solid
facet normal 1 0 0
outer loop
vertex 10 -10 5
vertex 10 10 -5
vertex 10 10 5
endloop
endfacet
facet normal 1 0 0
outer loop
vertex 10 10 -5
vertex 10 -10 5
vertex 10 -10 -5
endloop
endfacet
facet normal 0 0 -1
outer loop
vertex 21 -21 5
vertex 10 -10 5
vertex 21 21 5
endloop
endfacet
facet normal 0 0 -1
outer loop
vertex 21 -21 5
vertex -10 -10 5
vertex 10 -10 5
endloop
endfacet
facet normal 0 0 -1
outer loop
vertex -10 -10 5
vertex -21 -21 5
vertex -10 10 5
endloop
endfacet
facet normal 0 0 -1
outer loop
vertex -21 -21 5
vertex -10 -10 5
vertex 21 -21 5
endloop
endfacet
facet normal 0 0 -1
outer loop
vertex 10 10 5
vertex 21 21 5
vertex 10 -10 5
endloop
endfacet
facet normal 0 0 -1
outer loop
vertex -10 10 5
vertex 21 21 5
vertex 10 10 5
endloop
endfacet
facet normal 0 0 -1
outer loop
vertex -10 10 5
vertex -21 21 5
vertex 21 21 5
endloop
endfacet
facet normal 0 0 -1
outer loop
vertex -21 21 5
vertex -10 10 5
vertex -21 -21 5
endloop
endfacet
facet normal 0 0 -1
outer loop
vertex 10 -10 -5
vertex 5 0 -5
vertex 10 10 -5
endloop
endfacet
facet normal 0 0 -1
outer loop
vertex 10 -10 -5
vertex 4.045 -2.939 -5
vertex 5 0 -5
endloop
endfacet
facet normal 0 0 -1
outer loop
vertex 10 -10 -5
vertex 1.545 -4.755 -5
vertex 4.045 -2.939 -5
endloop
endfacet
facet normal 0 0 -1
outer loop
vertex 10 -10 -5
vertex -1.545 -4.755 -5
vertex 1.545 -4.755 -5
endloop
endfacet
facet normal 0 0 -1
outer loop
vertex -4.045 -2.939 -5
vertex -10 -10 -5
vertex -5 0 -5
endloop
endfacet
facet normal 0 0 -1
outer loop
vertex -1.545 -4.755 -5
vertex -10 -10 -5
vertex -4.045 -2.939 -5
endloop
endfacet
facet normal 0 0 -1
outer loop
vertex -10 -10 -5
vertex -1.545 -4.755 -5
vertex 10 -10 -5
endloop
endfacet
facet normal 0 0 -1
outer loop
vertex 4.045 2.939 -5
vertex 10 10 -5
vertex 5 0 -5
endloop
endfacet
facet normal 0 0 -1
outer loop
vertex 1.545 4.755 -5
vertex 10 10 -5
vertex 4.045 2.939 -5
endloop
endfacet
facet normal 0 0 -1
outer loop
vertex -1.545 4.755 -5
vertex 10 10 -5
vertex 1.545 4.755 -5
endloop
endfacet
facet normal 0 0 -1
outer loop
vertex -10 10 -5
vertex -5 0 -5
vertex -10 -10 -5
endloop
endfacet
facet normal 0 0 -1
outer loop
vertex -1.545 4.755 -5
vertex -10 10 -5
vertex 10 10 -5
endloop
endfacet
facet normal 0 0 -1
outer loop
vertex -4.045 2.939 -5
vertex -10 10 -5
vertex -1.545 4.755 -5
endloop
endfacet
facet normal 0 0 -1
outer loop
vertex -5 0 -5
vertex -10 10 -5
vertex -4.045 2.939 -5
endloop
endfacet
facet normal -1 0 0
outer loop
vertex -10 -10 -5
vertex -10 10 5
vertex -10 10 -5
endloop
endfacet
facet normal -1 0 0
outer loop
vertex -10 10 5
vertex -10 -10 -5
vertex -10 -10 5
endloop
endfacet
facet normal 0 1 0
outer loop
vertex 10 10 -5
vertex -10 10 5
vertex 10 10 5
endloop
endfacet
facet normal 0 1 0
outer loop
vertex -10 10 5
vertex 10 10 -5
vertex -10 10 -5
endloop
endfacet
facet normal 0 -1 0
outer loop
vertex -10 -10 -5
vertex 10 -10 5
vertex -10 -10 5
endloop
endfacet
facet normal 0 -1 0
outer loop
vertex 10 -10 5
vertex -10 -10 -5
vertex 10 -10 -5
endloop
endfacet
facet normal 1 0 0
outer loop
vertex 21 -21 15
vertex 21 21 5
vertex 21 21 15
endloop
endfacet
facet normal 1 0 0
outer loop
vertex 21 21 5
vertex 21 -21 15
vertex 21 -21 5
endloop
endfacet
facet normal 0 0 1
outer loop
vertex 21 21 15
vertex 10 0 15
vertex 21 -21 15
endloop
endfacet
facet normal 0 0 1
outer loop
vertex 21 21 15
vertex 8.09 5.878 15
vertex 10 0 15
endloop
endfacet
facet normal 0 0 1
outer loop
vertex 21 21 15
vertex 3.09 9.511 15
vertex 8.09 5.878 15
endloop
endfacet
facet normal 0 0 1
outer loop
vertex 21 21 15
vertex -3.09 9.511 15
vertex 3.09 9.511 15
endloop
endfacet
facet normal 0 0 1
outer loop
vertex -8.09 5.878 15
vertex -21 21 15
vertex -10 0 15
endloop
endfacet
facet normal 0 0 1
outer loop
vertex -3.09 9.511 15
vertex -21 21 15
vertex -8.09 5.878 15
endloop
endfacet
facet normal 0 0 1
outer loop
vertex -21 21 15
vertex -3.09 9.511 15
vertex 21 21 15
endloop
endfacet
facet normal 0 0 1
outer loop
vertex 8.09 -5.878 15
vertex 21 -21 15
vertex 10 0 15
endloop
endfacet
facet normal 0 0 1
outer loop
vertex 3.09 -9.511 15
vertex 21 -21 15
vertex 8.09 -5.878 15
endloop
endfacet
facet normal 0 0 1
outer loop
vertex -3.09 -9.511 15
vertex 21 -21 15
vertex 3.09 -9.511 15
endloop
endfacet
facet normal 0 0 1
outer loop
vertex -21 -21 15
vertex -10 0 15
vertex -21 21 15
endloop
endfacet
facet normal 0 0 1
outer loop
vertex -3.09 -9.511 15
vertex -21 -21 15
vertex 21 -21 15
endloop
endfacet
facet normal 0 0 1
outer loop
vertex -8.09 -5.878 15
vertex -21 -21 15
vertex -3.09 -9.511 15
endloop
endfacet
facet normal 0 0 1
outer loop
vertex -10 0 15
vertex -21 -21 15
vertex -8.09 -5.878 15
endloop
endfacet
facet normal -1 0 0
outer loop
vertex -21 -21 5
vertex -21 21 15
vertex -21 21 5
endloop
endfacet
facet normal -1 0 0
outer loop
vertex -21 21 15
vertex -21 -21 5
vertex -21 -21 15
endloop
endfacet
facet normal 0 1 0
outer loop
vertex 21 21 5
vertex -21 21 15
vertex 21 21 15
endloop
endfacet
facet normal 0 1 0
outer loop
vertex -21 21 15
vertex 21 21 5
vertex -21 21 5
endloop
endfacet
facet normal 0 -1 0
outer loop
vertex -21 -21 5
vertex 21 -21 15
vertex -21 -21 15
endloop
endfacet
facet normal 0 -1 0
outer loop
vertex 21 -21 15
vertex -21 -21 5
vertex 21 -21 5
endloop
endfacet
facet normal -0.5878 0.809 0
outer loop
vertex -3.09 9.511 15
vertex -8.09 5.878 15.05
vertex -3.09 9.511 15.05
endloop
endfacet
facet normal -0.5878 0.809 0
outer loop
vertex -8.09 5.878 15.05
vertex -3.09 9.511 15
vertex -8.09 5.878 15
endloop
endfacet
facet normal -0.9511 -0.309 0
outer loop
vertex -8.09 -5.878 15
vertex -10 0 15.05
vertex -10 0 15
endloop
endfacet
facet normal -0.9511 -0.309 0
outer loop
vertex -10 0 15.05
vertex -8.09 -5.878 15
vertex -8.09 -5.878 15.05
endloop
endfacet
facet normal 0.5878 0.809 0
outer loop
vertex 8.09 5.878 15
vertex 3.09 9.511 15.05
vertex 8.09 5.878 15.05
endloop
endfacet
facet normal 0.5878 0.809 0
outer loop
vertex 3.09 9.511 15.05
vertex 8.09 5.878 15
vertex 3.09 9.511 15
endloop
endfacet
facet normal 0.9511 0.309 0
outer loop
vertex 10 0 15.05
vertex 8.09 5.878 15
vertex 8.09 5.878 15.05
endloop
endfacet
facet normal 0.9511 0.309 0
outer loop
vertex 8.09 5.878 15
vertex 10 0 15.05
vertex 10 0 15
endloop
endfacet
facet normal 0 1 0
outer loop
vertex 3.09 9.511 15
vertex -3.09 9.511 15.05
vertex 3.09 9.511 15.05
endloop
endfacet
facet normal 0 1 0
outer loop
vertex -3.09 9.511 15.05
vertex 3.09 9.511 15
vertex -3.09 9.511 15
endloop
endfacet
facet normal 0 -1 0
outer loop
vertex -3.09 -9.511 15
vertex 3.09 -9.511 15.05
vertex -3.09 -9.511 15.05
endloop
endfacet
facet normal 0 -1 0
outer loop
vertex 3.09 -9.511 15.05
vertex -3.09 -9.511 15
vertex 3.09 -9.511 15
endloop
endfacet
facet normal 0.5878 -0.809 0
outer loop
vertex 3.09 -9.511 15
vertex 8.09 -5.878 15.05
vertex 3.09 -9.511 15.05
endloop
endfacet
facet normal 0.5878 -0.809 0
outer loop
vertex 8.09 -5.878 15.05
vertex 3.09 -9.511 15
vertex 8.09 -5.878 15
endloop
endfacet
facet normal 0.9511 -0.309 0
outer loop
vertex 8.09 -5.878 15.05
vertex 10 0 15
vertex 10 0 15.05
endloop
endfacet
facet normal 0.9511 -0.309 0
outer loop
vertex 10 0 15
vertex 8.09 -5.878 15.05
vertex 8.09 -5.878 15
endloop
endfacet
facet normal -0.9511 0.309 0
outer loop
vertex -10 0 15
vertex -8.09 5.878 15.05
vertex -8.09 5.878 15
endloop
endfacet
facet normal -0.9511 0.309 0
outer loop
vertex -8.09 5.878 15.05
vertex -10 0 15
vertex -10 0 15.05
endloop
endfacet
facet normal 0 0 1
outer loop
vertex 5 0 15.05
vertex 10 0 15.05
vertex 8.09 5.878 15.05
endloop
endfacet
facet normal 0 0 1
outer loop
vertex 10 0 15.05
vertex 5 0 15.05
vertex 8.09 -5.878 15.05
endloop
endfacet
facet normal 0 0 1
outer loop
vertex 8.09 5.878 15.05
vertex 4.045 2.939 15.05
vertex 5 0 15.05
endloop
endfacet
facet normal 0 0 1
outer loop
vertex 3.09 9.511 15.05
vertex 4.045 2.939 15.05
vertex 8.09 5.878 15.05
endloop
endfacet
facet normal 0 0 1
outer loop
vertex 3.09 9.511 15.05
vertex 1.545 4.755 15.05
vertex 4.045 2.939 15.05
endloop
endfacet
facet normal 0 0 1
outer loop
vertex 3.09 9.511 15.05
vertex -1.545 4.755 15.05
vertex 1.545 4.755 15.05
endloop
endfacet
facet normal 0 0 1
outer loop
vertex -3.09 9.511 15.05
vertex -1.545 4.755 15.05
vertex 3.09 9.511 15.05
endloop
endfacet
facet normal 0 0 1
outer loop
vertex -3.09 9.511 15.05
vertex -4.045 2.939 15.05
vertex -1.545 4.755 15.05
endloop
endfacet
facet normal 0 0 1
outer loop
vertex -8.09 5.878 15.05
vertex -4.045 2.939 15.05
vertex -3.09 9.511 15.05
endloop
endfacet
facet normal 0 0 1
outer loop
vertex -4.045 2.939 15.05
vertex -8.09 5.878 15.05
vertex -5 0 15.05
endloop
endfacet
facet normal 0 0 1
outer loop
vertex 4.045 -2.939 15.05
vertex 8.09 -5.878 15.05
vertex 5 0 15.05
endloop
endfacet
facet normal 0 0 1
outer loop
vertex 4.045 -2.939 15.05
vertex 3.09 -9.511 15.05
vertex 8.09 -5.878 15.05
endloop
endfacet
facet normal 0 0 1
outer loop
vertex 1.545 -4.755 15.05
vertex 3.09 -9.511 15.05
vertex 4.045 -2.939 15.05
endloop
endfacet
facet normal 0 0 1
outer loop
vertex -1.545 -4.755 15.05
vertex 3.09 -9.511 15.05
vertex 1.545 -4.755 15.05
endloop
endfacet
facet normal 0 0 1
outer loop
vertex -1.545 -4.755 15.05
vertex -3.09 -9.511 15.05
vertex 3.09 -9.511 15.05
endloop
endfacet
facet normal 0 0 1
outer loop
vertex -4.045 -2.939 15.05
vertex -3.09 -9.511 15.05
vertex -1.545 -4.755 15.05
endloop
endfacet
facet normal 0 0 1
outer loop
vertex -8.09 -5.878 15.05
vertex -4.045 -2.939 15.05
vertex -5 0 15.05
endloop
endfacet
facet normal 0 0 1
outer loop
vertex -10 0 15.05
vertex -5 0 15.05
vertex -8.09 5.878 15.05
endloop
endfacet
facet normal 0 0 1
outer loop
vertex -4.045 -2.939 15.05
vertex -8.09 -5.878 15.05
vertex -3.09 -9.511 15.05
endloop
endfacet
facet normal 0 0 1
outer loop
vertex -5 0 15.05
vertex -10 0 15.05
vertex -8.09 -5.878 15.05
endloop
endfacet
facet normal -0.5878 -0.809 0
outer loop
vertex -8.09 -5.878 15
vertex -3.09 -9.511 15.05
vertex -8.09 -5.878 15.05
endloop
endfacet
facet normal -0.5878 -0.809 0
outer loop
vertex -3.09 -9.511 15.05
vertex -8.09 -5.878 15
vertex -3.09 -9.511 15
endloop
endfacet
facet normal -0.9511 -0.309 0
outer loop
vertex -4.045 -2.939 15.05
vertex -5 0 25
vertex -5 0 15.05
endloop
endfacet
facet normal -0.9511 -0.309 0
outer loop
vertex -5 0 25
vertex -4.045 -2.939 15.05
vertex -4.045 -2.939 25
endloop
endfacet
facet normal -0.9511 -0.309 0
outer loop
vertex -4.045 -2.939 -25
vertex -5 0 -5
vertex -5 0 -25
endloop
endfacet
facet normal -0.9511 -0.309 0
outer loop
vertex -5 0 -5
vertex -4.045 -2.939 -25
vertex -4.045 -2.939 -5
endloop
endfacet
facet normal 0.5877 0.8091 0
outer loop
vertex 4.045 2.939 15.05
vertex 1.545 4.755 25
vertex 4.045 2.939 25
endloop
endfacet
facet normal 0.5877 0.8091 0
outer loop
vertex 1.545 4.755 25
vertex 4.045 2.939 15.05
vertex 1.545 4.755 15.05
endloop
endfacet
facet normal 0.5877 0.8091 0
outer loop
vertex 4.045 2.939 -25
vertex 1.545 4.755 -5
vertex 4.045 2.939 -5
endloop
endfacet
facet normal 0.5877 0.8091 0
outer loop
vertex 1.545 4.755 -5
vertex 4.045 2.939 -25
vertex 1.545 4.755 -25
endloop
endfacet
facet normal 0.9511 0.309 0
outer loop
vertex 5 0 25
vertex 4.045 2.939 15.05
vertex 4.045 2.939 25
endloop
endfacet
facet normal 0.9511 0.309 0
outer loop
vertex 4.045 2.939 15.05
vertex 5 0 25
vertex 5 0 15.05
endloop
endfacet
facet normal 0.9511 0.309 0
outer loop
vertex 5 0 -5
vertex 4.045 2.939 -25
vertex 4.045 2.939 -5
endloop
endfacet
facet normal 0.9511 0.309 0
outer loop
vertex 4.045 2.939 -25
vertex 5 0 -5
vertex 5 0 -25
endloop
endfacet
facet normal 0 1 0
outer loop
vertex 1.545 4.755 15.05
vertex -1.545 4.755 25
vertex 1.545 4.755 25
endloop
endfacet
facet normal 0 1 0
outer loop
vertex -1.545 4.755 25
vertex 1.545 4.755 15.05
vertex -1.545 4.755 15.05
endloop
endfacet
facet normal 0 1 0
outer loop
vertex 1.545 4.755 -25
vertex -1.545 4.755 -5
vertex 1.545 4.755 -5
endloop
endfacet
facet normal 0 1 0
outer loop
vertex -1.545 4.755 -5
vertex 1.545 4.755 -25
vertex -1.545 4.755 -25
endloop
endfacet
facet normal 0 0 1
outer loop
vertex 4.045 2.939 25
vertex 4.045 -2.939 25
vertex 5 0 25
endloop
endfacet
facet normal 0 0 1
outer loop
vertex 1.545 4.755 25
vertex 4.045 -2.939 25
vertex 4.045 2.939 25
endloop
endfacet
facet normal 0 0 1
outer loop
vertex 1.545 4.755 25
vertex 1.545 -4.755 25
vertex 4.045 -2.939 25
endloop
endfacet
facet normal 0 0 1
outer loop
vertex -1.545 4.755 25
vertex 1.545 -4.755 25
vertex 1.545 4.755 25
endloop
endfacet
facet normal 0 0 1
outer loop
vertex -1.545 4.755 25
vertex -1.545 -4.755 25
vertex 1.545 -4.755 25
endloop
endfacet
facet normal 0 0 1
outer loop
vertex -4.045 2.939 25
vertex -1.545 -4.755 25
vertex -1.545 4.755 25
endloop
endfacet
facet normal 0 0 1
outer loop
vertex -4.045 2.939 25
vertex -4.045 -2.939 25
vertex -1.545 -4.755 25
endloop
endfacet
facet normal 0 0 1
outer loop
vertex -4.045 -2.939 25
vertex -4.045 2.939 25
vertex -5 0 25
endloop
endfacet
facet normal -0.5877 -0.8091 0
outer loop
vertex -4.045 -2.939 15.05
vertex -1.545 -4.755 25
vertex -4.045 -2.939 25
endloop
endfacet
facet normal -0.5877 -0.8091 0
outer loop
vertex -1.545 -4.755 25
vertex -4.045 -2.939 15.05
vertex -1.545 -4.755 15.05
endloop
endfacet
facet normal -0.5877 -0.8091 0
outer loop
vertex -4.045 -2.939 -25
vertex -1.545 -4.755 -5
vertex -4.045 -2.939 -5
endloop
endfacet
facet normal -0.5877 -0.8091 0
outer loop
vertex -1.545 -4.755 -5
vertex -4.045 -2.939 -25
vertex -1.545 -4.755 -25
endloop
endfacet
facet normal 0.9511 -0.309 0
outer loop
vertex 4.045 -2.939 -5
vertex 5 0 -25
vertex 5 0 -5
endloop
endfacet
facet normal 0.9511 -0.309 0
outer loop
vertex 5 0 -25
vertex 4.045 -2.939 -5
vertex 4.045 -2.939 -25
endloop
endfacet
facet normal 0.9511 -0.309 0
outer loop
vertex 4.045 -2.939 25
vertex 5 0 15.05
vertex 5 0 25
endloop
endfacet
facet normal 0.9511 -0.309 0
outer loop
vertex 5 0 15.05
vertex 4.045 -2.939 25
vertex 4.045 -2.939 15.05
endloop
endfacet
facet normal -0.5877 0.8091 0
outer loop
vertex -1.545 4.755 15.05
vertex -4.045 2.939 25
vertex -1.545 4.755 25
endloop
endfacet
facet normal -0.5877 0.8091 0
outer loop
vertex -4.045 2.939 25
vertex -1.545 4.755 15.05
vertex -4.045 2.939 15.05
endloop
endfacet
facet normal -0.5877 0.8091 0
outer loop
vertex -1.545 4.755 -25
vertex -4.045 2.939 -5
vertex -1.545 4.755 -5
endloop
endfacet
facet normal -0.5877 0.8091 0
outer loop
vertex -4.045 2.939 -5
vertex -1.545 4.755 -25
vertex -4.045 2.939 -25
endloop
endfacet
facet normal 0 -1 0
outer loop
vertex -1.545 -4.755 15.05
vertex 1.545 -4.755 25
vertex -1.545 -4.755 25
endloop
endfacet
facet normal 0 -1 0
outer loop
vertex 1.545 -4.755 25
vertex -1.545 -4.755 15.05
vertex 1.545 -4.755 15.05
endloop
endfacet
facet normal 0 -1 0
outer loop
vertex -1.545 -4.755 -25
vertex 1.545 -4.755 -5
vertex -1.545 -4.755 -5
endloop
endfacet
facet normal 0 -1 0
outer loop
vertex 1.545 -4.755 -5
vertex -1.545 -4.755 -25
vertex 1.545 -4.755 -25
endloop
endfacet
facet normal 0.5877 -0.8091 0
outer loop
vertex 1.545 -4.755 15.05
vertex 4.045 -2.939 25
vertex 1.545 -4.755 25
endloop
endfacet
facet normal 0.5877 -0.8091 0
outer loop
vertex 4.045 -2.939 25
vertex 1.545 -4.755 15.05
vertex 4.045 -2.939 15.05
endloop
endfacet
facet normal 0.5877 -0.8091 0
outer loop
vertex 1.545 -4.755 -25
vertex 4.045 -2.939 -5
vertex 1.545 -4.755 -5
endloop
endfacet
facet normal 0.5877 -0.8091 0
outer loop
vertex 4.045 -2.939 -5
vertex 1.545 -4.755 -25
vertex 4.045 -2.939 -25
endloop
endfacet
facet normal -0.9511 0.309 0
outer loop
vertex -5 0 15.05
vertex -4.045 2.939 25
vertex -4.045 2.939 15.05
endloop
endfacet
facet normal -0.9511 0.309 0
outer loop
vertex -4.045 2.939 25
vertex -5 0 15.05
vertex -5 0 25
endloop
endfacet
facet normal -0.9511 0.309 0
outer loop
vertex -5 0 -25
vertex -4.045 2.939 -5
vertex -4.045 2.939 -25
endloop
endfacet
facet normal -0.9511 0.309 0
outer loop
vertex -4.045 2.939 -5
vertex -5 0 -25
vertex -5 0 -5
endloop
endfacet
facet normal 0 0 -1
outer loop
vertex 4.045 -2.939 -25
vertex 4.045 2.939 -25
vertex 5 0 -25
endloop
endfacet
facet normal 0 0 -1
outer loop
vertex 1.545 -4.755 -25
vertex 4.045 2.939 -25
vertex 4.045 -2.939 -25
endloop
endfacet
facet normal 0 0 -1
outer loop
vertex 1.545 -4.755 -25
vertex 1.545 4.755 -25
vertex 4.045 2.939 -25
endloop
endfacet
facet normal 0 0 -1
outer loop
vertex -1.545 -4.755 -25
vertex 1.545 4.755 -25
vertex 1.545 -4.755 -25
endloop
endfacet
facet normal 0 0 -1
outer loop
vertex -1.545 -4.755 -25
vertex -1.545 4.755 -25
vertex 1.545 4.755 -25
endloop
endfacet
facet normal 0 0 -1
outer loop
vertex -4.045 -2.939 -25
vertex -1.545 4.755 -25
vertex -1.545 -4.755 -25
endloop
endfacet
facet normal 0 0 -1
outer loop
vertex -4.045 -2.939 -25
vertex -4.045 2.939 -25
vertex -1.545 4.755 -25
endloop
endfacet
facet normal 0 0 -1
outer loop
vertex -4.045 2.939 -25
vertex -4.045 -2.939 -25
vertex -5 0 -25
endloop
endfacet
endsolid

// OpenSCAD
$fn=10;

height = 10;
webbing_thickness = 7.2;
hole_edge = 20;
retainer_edge = 42;

socket_diameter= 25;
hole_diameter = 10;
//
//cylinder(d=hole_diameter, h=20);
//cylinder(d=socket_diameter, h=7.5);

union() {
union() {
    cube([hole_edge,hole_edge,height], center=true);
    translate([0, 0, height]) {
        cube([retainer_edge,retainer_edge,height], center=true);
    }
}

    
color("red") {
    union() {
        translate([0, 0, height]) {
            cylinder(d=hole_edge, h=height+0.1, center=true);
        }
        cylinder(d=hole_diameter, h=50, center=true);
    }
}
}
